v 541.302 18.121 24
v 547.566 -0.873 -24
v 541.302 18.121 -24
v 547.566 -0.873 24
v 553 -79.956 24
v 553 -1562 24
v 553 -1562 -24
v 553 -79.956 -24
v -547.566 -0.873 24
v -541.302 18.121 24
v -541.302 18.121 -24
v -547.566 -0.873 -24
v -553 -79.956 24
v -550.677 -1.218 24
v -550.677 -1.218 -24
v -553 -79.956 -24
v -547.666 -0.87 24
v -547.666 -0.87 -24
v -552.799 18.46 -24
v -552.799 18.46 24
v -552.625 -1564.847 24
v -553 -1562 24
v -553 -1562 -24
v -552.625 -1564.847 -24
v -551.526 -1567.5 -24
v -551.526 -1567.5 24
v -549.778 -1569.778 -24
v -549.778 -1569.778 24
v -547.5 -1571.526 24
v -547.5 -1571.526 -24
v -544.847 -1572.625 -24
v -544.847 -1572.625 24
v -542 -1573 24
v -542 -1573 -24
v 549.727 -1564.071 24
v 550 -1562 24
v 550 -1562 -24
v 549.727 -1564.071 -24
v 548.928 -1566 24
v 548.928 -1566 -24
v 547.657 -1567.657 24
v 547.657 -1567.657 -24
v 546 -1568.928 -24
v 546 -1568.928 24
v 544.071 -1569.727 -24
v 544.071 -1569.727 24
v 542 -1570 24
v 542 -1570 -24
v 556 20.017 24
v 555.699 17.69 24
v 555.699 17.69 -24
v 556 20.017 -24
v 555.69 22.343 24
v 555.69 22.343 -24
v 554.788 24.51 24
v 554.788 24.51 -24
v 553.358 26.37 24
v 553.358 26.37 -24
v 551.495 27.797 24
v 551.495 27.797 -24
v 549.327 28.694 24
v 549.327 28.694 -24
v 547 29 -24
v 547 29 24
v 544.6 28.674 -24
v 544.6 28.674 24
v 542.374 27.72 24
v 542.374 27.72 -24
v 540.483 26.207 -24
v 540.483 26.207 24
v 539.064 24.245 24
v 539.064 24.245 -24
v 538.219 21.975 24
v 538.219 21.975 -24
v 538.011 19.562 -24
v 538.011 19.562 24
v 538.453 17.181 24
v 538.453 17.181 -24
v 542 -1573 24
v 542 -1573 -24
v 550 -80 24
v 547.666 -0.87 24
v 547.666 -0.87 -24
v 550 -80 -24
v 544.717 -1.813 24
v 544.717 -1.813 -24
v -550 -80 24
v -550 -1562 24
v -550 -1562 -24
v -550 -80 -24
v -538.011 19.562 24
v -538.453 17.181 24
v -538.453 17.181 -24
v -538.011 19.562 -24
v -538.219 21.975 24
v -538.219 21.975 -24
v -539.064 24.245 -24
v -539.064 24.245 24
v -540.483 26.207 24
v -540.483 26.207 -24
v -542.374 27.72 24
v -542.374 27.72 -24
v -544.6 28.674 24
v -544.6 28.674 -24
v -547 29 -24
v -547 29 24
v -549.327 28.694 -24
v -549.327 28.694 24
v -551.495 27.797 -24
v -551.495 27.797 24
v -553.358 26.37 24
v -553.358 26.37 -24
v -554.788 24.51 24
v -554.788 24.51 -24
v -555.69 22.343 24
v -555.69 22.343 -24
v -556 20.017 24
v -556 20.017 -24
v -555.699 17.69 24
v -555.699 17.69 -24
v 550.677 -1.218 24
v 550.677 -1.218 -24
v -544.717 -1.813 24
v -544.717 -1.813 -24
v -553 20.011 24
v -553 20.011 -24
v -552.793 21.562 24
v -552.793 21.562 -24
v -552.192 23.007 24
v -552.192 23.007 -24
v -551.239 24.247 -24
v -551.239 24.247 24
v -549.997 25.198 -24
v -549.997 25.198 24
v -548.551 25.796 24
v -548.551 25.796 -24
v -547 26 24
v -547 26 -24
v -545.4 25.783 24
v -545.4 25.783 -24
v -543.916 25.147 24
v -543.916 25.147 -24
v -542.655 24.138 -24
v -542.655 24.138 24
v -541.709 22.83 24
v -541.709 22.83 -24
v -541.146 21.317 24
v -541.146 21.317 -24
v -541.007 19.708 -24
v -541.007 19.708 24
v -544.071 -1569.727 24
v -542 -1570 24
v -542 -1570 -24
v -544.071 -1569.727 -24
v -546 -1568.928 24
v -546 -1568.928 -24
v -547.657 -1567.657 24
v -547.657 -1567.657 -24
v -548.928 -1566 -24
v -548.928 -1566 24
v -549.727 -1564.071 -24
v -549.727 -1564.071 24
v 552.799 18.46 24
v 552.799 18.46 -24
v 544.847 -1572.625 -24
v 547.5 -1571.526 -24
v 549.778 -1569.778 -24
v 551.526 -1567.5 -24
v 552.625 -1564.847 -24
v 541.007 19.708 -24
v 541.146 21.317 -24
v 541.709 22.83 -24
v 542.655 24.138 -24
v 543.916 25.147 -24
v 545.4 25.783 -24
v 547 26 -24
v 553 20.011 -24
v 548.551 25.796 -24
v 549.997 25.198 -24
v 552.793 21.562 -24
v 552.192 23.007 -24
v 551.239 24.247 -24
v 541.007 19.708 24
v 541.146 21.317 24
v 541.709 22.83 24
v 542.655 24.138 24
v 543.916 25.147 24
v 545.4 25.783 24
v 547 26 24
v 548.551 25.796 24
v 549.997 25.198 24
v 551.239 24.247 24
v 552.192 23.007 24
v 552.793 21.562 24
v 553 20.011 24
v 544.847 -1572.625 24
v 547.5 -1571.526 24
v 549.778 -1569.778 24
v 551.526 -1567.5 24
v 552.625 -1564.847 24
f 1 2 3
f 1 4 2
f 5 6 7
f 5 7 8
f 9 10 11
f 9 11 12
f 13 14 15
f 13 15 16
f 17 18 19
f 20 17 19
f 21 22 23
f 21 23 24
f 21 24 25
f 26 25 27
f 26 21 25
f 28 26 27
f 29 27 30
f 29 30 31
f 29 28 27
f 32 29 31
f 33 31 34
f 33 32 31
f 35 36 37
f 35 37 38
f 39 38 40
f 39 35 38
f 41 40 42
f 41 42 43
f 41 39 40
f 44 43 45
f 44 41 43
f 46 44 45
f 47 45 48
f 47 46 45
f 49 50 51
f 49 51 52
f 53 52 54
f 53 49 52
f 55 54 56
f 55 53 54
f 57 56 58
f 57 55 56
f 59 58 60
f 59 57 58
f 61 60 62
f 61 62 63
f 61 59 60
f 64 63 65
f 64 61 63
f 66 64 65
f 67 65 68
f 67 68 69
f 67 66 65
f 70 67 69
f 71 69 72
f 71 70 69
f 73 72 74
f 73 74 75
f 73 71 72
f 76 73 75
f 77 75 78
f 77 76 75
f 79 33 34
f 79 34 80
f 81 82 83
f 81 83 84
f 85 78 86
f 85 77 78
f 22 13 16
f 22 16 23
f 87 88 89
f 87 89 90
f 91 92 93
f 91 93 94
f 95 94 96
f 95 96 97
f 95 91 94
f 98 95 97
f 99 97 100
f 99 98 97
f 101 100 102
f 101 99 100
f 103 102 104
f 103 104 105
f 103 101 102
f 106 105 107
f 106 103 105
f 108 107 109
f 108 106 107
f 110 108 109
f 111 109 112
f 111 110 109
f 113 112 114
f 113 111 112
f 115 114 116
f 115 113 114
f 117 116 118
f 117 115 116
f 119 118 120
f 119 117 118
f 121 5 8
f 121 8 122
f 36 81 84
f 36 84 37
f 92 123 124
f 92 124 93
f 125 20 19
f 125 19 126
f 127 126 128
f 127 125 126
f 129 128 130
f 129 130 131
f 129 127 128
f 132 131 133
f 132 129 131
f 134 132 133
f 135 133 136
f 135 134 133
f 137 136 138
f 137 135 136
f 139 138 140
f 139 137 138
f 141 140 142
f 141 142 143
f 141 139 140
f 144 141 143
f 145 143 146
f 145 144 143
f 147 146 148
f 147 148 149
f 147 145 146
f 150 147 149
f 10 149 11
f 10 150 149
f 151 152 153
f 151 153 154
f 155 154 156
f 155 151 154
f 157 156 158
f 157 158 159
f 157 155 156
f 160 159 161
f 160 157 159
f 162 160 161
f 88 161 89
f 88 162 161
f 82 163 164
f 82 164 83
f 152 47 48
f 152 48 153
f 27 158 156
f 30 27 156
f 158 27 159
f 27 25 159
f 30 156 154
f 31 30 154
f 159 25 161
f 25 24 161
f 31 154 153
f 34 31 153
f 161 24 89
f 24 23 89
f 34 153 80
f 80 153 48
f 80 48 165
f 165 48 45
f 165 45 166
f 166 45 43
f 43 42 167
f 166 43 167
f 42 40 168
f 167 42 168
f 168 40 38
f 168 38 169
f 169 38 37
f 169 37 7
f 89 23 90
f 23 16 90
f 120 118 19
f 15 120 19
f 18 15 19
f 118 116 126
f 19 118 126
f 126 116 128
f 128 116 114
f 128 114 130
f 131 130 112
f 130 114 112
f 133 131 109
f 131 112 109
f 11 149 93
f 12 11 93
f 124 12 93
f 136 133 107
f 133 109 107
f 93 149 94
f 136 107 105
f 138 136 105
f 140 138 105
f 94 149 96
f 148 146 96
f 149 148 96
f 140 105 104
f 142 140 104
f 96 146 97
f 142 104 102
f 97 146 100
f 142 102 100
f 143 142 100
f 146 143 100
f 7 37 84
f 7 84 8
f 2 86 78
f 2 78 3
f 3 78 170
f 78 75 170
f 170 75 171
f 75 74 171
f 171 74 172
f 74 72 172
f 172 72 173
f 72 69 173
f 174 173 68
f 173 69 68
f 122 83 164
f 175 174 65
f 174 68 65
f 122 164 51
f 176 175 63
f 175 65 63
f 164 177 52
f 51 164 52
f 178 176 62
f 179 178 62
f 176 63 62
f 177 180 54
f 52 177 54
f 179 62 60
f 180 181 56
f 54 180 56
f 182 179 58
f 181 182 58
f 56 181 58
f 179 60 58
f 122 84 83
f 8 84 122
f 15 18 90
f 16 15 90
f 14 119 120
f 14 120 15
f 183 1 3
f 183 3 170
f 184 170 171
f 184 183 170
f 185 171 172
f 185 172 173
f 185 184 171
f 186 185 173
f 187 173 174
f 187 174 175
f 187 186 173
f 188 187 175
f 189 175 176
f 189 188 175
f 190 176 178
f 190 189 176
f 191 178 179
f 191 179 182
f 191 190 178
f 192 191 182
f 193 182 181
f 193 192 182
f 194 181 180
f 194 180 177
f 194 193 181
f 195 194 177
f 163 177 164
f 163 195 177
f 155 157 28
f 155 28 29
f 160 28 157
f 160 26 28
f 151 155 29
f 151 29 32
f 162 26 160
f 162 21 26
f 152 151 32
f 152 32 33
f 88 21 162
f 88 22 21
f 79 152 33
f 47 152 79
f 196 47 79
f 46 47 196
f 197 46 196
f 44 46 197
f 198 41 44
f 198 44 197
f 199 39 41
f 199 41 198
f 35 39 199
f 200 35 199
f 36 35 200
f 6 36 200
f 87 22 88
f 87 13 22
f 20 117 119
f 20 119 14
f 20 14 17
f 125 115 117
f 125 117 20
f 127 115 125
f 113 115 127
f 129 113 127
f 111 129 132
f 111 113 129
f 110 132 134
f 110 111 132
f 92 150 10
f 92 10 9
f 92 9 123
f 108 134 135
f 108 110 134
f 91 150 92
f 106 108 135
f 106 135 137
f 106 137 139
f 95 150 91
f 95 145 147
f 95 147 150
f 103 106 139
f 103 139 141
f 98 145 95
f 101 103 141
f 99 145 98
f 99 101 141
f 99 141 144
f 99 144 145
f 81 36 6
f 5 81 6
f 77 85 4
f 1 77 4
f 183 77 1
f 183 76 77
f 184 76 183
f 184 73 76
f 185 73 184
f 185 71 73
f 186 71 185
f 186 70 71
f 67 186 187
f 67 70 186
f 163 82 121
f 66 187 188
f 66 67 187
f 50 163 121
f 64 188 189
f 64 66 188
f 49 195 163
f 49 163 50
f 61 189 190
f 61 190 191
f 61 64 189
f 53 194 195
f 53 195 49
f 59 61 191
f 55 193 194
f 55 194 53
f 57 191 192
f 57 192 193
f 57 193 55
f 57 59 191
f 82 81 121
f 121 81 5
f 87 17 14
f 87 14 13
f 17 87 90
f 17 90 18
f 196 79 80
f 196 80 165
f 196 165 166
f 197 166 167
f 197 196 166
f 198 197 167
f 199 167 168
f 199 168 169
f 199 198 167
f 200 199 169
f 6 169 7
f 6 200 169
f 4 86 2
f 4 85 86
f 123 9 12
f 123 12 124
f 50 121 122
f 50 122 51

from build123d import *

# Parameters (mm, degrees)
EXTRU_MINCE1_DEPTH = 24


with BuildPart() as part:
    # Esquisse1 → Extru.-Mince1 (new body, symmetric)
    with BuildSketch(Plane.XY):
        with BuildLine():
            Line((547.565725672, -0.87294791), (541.301863245, 18.120841272))
            ThreePointArc((541.301863245, 18.120841272), (542.138161234, 23.516038085), (547, 26))
            ThreePointArc((547, 26), (551.756047412, 23.65787001), (552.799001066, 18.460004337))
            Line((552.799001066, 18.460004337), (547.665682189, -0.869999215))
            Line((547.665682189, -0.869999215), (550, -80))
            Line((550, -80), (550, -1562))
            ThreePointArc((550, -1562), (547.656854249, -1567.656854249), (542, -1570))
            Line((542, -1570), (-542, -1570))
            ThreePointArc((-542, -1570), (-547.656854249, -1567.656854249), (-550, -1562))
            Line((-550, -1562), (-550, -80))
            Line((-550, -80), (-547.665682189, -0.869999215))
            Line((-547.665682189, -0.869999215), (-552.799001066, 18.460004337))
            ThreePointArc((-552.799001066, 18.460004337), (-551.756047412, 23.65787001), (-547, 26))
            ThreePointArc((-547, 26), (-542.138161234, 23.516038085), (-541.301863245, 18.120841272))
            Line((-541.301863245, 18.120841272), (-547.565725672, -0.87294791))
            Line((-547.565725672, -0.87294791), (-544.716657295, -1.812527274))
            Line((-544.716657295, -1.812527274), (-538.452794868, 17.181261908))
            ThreePointArc((-538.452794868, 17.181261908), (-539.707241851, 25.274057128), (-547, 29))
            ThreePointArc((-547, 29), (-554.134071119, 25.486805015), (-555.698501598, 17.690006505))
            Line((-555.698501598, 17.690006505), (-550.677252807, -1.217986412))
            Line((-550.677252807, -1.217986412), (-553, -79.955759949))
            Line((-553, -79.955759949), (-553, -1562))
            ThreePointArc((-553, -1562), (-549.778174593, -1569.778174593), (-542, -1573))
            Line((-542, -1573), (542, -1573))
            ThreePointArc((542, -1573), (549.778174593, -1569.778174593), (553, -1562))
            Line((553, -1562), (553, -79.955759949))
            Line((553, -79.955759949), (550.677252807, -1.217986412))
            Line((550.677252807, -1.217986412), (555.698501598, 17.690006505))
            ThreePointArc((555.698501598, 17.690006505), (554.134071119, 25.486805015), (547, 29))
            ThreePointArc((547, 29), (539.707241851, 25.274057128), (538.452794868, 17.181261908))
            Line((538.452794868, 17.181261908), (544.716657295, -1.812527274))
            Line((544.716657295, -1.812527274), (547.565725672, -0.87294791))
        make_face()
    extrude(amount=EXTRU_MINCE1_DEPTH, both=True)


solid = part.part
